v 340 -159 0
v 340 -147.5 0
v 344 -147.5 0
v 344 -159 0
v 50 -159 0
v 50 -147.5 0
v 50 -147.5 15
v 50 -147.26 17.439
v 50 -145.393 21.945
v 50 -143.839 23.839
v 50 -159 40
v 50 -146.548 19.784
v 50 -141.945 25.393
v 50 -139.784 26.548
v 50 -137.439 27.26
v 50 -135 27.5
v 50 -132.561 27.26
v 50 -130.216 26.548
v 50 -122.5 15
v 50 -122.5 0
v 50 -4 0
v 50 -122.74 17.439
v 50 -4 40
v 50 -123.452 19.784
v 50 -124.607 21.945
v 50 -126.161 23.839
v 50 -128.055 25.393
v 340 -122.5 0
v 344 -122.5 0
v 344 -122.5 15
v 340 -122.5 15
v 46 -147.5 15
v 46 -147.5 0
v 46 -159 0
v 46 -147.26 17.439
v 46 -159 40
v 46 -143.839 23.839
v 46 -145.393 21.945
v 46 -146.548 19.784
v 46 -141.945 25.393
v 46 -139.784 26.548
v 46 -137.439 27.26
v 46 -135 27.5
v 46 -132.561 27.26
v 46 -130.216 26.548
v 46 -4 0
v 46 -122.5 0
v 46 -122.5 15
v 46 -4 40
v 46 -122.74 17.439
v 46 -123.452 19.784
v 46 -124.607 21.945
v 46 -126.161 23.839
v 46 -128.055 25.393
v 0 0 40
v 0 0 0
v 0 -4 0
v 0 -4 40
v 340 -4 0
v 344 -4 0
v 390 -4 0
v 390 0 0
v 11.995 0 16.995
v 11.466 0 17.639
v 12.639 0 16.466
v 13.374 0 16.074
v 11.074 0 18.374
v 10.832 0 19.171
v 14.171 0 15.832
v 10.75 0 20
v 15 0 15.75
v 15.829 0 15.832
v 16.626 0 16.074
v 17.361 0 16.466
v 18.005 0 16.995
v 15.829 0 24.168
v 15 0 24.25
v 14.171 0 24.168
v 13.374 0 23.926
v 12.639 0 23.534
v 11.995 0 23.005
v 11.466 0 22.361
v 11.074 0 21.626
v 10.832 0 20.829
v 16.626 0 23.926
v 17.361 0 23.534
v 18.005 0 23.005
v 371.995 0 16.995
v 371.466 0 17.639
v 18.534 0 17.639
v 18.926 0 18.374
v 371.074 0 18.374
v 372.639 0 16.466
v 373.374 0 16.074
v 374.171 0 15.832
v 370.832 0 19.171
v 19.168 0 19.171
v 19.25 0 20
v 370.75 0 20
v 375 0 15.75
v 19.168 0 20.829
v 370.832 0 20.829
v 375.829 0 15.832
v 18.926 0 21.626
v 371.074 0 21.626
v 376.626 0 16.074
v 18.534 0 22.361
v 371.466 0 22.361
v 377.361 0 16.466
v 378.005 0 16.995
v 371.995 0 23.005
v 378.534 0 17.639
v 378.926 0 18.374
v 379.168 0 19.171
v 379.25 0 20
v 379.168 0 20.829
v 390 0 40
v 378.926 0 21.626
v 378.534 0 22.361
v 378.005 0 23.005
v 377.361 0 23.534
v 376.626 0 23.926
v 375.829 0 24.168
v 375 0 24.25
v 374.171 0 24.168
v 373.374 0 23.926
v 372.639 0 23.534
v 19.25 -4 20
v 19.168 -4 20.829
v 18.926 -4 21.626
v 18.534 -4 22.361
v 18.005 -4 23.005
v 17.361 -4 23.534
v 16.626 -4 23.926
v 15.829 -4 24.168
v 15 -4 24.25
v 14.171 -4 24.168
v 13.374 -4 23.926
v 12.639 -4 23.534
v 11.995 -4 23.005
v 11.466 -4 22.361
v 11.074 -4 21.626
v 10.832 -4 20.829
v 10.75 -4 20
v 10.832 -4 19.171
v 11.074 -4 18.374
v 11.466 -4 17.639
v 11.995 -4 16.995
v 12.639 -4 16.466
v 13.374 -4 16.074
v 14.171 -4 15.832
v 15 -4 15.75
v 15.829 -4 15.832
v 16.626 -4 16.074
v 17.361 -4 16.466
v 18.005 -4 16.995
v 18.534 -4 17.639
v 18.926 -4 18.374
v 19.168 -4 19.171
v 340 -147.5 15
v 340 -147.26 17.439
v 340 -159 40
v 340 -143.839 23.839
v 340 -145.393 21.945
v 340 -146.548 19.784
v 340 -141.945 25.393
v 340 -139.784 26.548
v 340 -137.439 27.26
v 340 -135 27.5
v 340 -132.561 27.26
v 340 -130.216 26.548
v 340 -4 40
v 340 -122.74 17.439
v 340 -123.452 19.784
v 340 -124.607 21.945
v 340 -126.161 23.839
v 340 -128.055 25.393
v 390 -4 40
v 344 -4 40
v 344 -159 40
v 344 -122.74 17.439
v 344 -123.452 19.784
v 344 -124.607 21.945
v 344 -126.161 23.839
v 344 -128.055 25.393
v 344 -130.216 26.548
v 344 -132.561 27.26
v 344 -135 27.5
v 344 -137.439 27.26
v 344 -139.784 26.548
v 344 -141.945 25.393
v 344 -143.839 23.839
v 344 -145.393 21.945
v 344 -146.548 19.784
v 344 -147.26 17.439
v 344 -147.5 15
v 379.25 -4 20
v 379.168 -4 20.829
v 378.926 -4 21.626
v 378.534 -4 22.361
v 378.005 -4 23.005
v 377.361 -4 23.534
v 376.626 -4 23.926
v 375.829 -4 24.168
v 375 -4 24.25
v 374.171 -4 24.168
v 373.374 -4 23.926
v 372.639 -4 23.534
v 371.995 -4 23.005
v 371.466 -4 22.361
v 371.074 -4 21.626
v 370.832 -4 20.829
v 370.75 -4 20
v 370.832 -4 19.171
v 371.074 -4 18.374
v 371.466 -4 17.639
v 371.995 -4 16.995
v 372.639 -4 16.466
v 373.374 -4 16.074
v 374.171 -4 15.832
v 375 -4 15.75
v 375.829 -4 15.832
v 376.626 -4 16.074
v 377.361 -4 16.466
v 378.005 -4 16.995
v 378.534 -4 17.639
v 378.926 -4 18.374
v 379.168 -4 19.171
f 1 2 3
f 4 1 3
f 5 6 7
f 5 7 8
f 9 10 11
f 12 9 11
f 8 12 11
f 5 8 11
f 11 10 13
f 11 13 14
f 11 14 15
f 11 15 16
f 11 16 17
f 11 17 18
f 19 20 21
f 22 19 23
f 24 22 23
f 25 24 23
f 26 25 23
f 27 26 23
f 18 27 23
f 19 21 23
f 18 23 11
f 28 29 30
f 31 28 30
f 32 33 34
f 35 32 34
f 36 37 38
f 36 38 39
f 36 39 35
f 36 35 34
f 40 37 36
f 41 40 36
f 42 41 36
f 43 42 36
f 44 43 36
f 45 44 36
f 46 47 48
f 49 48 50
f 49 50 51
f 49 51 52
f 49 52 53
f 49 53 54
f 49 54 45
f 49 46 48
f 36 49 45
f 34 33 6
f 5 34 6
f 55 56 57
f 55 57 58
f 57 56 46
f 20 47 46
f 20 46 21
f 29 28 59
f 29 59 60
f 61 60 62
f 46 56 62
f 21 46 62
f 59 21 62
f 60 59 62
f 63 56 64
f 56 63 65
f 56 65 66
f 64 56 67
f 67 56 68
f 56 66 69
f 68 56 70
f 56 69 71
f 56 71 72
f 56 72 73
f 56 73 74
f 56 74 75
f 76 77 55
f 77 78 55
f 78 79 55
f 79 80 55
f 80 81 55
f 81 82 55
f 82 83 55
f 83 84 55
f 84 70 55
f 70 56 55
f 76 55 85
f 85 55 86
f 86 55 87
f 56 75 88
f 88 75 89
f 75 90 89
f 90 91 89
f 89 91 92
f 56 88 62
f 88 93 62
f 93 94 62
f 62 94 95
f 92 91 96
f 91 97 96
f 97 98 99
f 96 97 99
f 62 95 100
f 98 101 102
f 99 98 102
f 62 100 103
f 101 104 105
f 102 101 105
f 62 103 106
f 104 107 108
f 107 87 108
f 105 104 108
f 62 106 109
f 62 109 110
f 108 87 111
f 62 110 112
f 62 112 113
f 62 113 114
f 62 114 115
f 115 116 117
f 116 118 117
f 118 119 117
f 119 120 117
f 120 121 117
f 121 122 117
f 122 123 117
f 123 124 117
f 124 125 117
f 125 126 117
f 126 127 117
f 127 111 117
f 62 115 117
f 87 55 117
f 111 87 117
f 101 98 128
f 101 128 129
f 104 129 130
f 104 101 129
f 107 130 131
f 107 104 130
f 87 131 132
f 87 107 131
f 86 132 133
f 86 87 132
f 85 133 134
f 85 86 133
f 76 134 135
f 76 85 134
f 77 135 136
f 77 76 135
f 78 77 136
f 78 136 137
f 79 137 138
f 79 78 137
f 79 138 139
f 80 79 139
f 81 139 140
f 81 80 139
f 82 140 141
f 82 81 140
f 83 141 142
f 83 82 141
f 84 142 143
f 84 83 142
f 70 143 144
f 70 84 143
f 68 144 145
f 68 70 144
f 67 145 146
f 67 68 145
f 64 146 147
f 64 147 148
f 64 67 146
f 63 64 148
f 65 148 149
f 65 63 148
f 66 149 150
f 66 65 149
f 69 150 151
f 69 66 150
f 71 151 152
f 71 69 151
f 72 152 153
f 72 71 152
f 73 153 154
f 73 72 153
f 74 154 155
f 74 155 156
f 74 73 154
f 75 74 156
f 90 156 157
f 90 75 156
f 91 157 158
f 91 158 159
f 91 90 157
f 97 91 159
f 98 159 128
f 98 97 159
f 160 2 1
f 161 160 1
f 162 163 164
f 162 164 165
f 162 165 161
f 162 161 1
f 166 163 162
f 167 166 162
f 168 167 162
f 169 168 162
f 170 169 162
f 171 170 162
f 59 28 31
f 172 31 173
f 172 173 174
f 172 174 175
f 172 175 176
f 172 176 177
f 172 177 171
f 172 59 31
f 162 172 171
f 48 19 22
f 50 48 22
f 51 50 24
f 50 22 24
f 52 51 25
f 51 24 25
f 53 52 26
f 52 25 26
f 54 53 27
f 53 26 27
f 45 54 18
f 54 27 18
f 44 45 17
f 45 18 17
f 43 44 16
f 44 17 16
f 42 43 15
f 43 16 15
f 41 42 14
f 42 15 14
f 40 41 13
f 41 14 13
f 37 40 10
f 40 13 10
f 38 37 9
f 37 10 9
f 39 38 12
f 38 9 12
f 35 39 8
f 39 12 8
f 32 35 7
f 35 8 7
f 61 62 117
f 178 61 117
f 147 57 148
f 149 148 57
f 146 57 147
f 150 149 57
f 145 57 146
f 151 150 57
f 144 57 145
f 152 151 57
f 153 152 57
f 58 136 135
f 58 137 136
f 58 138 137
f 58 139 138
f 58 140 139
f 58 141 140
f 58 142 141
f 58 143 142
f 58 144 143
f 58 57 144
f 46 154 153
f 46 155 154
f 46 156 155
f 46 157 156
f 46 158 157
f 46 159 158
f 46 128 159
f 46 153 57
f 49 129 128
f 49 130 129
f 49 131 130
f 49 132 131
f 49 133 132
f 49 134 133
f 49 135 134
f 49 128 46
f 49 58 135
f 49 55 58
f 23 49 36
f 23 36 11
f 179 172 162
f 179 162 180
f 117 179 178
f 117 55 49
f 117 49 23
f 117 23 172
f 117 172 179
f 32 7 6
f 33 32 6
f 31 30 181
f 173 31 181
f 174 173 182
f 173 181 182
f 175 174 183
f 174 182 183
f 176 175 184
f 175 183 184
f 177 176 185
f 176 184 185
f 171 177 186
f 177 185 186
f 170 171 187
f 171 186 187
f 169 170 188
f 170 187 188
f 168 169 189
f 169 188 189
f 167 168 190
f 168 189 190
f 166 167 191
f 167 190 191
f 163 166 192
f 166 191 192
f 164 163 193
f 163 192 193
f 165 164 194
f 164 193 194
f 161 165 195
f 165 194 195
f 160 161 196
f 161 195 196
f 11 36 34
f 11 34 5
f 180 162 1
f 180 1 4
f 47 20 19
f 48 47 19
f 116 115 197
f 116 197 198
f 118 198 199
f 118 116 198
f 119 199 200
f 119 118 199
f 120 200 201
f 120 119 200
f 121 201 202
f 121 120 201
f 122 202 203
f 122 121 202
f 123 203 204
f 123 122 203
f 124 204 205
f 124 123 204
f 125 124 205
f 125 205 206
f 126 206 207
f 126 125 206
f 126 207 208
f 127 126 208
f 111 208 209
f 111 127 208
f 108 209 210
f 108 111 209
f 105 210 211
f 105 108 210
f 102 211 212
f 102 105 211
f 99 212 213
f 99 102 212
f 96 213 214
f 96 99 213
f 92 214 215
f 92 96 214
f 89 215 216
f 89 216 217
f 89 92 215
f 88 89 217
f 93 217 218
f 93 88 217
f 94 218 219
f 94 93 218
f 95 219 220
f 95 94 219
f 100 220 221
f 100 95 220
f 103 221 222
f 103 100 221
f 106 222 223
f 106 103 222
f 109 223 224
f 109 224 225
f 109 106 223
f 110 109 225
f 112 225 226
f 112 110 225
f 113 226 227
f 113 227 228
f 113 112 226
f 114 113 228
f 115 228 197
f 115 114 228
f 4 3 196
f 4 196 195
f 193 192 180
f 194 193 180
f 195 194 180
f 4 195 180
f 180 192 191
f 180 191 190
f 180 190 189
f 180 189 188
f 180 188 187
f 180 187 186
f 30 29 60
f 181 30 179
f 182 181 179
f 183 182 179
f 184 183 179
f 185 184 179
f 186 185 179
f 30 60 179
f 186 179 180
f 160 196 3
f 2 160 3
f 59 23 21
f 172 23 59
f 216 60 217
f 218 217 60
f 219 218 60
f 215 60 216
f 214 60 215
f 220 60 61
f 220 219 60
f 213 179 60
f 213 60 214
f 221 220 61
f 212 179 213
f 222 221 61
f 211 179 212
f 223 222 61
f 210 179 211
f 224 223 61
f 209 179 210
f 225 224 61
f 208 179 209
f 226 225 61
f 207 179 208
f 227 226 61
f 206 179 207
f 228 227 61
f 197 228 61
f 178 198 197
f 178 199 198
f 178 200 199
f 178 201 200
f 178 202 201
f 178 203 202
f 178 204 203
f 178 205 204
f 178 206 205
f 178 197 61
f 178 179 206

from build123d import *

# Parameters (mm, degrees)
F0_W     = 390
F0_H     = 40
F0_R     = 4.25
F1_DEPTH = 4
F2_W     = 4
F2_H     = 40
F3_DEPTH = 155
F5_DEPTH = 298


with BuildPart() as f1:
    # F0 (on Front) → F1 (new body)
    with BuildSketch(Plane.XZ):
        with Locations((195, 20)):
            Rectangle(F0_W, F0_H)
        with Locations((15, 20)):
            Circle(F0_R, mode=Mode.SUBTRACT)
        with Locations((375, 20)):
            Circle(F0_R, mode=Mode.SUBTRACT)
    extrude(amount=F1_DEPTH)

    # F2 (on face) → F3 (join)
    with BuildSketch(Plane.XZ.offset(4)):
        with Locations((48, 20)):
            Rectangle(F2_W, F2_H)
        with Locations((342, 20)):
            Rectangle(F2_W, F2_H)
    extrude(amount=F3_DEPTH)

    # F4 (on face) → F5 (cut, through all)
    with BuildSketch(Plane.YZ.offset(344)):
        with BuildLine():
            Line((-122.5, 0), (-122.5, 15))
            ThreePointArc((-122.5, 15), (-135, 27.5), (-147.5, 15))
            Line((-147.5, 15), (-147.5, 0))
            Line((-147.5, 0), (-122.5, 0))
        make_face()
    extrude(amount=-F5_DEPTH, mode=Mode.SUBTRACT)


solid = f1.part
